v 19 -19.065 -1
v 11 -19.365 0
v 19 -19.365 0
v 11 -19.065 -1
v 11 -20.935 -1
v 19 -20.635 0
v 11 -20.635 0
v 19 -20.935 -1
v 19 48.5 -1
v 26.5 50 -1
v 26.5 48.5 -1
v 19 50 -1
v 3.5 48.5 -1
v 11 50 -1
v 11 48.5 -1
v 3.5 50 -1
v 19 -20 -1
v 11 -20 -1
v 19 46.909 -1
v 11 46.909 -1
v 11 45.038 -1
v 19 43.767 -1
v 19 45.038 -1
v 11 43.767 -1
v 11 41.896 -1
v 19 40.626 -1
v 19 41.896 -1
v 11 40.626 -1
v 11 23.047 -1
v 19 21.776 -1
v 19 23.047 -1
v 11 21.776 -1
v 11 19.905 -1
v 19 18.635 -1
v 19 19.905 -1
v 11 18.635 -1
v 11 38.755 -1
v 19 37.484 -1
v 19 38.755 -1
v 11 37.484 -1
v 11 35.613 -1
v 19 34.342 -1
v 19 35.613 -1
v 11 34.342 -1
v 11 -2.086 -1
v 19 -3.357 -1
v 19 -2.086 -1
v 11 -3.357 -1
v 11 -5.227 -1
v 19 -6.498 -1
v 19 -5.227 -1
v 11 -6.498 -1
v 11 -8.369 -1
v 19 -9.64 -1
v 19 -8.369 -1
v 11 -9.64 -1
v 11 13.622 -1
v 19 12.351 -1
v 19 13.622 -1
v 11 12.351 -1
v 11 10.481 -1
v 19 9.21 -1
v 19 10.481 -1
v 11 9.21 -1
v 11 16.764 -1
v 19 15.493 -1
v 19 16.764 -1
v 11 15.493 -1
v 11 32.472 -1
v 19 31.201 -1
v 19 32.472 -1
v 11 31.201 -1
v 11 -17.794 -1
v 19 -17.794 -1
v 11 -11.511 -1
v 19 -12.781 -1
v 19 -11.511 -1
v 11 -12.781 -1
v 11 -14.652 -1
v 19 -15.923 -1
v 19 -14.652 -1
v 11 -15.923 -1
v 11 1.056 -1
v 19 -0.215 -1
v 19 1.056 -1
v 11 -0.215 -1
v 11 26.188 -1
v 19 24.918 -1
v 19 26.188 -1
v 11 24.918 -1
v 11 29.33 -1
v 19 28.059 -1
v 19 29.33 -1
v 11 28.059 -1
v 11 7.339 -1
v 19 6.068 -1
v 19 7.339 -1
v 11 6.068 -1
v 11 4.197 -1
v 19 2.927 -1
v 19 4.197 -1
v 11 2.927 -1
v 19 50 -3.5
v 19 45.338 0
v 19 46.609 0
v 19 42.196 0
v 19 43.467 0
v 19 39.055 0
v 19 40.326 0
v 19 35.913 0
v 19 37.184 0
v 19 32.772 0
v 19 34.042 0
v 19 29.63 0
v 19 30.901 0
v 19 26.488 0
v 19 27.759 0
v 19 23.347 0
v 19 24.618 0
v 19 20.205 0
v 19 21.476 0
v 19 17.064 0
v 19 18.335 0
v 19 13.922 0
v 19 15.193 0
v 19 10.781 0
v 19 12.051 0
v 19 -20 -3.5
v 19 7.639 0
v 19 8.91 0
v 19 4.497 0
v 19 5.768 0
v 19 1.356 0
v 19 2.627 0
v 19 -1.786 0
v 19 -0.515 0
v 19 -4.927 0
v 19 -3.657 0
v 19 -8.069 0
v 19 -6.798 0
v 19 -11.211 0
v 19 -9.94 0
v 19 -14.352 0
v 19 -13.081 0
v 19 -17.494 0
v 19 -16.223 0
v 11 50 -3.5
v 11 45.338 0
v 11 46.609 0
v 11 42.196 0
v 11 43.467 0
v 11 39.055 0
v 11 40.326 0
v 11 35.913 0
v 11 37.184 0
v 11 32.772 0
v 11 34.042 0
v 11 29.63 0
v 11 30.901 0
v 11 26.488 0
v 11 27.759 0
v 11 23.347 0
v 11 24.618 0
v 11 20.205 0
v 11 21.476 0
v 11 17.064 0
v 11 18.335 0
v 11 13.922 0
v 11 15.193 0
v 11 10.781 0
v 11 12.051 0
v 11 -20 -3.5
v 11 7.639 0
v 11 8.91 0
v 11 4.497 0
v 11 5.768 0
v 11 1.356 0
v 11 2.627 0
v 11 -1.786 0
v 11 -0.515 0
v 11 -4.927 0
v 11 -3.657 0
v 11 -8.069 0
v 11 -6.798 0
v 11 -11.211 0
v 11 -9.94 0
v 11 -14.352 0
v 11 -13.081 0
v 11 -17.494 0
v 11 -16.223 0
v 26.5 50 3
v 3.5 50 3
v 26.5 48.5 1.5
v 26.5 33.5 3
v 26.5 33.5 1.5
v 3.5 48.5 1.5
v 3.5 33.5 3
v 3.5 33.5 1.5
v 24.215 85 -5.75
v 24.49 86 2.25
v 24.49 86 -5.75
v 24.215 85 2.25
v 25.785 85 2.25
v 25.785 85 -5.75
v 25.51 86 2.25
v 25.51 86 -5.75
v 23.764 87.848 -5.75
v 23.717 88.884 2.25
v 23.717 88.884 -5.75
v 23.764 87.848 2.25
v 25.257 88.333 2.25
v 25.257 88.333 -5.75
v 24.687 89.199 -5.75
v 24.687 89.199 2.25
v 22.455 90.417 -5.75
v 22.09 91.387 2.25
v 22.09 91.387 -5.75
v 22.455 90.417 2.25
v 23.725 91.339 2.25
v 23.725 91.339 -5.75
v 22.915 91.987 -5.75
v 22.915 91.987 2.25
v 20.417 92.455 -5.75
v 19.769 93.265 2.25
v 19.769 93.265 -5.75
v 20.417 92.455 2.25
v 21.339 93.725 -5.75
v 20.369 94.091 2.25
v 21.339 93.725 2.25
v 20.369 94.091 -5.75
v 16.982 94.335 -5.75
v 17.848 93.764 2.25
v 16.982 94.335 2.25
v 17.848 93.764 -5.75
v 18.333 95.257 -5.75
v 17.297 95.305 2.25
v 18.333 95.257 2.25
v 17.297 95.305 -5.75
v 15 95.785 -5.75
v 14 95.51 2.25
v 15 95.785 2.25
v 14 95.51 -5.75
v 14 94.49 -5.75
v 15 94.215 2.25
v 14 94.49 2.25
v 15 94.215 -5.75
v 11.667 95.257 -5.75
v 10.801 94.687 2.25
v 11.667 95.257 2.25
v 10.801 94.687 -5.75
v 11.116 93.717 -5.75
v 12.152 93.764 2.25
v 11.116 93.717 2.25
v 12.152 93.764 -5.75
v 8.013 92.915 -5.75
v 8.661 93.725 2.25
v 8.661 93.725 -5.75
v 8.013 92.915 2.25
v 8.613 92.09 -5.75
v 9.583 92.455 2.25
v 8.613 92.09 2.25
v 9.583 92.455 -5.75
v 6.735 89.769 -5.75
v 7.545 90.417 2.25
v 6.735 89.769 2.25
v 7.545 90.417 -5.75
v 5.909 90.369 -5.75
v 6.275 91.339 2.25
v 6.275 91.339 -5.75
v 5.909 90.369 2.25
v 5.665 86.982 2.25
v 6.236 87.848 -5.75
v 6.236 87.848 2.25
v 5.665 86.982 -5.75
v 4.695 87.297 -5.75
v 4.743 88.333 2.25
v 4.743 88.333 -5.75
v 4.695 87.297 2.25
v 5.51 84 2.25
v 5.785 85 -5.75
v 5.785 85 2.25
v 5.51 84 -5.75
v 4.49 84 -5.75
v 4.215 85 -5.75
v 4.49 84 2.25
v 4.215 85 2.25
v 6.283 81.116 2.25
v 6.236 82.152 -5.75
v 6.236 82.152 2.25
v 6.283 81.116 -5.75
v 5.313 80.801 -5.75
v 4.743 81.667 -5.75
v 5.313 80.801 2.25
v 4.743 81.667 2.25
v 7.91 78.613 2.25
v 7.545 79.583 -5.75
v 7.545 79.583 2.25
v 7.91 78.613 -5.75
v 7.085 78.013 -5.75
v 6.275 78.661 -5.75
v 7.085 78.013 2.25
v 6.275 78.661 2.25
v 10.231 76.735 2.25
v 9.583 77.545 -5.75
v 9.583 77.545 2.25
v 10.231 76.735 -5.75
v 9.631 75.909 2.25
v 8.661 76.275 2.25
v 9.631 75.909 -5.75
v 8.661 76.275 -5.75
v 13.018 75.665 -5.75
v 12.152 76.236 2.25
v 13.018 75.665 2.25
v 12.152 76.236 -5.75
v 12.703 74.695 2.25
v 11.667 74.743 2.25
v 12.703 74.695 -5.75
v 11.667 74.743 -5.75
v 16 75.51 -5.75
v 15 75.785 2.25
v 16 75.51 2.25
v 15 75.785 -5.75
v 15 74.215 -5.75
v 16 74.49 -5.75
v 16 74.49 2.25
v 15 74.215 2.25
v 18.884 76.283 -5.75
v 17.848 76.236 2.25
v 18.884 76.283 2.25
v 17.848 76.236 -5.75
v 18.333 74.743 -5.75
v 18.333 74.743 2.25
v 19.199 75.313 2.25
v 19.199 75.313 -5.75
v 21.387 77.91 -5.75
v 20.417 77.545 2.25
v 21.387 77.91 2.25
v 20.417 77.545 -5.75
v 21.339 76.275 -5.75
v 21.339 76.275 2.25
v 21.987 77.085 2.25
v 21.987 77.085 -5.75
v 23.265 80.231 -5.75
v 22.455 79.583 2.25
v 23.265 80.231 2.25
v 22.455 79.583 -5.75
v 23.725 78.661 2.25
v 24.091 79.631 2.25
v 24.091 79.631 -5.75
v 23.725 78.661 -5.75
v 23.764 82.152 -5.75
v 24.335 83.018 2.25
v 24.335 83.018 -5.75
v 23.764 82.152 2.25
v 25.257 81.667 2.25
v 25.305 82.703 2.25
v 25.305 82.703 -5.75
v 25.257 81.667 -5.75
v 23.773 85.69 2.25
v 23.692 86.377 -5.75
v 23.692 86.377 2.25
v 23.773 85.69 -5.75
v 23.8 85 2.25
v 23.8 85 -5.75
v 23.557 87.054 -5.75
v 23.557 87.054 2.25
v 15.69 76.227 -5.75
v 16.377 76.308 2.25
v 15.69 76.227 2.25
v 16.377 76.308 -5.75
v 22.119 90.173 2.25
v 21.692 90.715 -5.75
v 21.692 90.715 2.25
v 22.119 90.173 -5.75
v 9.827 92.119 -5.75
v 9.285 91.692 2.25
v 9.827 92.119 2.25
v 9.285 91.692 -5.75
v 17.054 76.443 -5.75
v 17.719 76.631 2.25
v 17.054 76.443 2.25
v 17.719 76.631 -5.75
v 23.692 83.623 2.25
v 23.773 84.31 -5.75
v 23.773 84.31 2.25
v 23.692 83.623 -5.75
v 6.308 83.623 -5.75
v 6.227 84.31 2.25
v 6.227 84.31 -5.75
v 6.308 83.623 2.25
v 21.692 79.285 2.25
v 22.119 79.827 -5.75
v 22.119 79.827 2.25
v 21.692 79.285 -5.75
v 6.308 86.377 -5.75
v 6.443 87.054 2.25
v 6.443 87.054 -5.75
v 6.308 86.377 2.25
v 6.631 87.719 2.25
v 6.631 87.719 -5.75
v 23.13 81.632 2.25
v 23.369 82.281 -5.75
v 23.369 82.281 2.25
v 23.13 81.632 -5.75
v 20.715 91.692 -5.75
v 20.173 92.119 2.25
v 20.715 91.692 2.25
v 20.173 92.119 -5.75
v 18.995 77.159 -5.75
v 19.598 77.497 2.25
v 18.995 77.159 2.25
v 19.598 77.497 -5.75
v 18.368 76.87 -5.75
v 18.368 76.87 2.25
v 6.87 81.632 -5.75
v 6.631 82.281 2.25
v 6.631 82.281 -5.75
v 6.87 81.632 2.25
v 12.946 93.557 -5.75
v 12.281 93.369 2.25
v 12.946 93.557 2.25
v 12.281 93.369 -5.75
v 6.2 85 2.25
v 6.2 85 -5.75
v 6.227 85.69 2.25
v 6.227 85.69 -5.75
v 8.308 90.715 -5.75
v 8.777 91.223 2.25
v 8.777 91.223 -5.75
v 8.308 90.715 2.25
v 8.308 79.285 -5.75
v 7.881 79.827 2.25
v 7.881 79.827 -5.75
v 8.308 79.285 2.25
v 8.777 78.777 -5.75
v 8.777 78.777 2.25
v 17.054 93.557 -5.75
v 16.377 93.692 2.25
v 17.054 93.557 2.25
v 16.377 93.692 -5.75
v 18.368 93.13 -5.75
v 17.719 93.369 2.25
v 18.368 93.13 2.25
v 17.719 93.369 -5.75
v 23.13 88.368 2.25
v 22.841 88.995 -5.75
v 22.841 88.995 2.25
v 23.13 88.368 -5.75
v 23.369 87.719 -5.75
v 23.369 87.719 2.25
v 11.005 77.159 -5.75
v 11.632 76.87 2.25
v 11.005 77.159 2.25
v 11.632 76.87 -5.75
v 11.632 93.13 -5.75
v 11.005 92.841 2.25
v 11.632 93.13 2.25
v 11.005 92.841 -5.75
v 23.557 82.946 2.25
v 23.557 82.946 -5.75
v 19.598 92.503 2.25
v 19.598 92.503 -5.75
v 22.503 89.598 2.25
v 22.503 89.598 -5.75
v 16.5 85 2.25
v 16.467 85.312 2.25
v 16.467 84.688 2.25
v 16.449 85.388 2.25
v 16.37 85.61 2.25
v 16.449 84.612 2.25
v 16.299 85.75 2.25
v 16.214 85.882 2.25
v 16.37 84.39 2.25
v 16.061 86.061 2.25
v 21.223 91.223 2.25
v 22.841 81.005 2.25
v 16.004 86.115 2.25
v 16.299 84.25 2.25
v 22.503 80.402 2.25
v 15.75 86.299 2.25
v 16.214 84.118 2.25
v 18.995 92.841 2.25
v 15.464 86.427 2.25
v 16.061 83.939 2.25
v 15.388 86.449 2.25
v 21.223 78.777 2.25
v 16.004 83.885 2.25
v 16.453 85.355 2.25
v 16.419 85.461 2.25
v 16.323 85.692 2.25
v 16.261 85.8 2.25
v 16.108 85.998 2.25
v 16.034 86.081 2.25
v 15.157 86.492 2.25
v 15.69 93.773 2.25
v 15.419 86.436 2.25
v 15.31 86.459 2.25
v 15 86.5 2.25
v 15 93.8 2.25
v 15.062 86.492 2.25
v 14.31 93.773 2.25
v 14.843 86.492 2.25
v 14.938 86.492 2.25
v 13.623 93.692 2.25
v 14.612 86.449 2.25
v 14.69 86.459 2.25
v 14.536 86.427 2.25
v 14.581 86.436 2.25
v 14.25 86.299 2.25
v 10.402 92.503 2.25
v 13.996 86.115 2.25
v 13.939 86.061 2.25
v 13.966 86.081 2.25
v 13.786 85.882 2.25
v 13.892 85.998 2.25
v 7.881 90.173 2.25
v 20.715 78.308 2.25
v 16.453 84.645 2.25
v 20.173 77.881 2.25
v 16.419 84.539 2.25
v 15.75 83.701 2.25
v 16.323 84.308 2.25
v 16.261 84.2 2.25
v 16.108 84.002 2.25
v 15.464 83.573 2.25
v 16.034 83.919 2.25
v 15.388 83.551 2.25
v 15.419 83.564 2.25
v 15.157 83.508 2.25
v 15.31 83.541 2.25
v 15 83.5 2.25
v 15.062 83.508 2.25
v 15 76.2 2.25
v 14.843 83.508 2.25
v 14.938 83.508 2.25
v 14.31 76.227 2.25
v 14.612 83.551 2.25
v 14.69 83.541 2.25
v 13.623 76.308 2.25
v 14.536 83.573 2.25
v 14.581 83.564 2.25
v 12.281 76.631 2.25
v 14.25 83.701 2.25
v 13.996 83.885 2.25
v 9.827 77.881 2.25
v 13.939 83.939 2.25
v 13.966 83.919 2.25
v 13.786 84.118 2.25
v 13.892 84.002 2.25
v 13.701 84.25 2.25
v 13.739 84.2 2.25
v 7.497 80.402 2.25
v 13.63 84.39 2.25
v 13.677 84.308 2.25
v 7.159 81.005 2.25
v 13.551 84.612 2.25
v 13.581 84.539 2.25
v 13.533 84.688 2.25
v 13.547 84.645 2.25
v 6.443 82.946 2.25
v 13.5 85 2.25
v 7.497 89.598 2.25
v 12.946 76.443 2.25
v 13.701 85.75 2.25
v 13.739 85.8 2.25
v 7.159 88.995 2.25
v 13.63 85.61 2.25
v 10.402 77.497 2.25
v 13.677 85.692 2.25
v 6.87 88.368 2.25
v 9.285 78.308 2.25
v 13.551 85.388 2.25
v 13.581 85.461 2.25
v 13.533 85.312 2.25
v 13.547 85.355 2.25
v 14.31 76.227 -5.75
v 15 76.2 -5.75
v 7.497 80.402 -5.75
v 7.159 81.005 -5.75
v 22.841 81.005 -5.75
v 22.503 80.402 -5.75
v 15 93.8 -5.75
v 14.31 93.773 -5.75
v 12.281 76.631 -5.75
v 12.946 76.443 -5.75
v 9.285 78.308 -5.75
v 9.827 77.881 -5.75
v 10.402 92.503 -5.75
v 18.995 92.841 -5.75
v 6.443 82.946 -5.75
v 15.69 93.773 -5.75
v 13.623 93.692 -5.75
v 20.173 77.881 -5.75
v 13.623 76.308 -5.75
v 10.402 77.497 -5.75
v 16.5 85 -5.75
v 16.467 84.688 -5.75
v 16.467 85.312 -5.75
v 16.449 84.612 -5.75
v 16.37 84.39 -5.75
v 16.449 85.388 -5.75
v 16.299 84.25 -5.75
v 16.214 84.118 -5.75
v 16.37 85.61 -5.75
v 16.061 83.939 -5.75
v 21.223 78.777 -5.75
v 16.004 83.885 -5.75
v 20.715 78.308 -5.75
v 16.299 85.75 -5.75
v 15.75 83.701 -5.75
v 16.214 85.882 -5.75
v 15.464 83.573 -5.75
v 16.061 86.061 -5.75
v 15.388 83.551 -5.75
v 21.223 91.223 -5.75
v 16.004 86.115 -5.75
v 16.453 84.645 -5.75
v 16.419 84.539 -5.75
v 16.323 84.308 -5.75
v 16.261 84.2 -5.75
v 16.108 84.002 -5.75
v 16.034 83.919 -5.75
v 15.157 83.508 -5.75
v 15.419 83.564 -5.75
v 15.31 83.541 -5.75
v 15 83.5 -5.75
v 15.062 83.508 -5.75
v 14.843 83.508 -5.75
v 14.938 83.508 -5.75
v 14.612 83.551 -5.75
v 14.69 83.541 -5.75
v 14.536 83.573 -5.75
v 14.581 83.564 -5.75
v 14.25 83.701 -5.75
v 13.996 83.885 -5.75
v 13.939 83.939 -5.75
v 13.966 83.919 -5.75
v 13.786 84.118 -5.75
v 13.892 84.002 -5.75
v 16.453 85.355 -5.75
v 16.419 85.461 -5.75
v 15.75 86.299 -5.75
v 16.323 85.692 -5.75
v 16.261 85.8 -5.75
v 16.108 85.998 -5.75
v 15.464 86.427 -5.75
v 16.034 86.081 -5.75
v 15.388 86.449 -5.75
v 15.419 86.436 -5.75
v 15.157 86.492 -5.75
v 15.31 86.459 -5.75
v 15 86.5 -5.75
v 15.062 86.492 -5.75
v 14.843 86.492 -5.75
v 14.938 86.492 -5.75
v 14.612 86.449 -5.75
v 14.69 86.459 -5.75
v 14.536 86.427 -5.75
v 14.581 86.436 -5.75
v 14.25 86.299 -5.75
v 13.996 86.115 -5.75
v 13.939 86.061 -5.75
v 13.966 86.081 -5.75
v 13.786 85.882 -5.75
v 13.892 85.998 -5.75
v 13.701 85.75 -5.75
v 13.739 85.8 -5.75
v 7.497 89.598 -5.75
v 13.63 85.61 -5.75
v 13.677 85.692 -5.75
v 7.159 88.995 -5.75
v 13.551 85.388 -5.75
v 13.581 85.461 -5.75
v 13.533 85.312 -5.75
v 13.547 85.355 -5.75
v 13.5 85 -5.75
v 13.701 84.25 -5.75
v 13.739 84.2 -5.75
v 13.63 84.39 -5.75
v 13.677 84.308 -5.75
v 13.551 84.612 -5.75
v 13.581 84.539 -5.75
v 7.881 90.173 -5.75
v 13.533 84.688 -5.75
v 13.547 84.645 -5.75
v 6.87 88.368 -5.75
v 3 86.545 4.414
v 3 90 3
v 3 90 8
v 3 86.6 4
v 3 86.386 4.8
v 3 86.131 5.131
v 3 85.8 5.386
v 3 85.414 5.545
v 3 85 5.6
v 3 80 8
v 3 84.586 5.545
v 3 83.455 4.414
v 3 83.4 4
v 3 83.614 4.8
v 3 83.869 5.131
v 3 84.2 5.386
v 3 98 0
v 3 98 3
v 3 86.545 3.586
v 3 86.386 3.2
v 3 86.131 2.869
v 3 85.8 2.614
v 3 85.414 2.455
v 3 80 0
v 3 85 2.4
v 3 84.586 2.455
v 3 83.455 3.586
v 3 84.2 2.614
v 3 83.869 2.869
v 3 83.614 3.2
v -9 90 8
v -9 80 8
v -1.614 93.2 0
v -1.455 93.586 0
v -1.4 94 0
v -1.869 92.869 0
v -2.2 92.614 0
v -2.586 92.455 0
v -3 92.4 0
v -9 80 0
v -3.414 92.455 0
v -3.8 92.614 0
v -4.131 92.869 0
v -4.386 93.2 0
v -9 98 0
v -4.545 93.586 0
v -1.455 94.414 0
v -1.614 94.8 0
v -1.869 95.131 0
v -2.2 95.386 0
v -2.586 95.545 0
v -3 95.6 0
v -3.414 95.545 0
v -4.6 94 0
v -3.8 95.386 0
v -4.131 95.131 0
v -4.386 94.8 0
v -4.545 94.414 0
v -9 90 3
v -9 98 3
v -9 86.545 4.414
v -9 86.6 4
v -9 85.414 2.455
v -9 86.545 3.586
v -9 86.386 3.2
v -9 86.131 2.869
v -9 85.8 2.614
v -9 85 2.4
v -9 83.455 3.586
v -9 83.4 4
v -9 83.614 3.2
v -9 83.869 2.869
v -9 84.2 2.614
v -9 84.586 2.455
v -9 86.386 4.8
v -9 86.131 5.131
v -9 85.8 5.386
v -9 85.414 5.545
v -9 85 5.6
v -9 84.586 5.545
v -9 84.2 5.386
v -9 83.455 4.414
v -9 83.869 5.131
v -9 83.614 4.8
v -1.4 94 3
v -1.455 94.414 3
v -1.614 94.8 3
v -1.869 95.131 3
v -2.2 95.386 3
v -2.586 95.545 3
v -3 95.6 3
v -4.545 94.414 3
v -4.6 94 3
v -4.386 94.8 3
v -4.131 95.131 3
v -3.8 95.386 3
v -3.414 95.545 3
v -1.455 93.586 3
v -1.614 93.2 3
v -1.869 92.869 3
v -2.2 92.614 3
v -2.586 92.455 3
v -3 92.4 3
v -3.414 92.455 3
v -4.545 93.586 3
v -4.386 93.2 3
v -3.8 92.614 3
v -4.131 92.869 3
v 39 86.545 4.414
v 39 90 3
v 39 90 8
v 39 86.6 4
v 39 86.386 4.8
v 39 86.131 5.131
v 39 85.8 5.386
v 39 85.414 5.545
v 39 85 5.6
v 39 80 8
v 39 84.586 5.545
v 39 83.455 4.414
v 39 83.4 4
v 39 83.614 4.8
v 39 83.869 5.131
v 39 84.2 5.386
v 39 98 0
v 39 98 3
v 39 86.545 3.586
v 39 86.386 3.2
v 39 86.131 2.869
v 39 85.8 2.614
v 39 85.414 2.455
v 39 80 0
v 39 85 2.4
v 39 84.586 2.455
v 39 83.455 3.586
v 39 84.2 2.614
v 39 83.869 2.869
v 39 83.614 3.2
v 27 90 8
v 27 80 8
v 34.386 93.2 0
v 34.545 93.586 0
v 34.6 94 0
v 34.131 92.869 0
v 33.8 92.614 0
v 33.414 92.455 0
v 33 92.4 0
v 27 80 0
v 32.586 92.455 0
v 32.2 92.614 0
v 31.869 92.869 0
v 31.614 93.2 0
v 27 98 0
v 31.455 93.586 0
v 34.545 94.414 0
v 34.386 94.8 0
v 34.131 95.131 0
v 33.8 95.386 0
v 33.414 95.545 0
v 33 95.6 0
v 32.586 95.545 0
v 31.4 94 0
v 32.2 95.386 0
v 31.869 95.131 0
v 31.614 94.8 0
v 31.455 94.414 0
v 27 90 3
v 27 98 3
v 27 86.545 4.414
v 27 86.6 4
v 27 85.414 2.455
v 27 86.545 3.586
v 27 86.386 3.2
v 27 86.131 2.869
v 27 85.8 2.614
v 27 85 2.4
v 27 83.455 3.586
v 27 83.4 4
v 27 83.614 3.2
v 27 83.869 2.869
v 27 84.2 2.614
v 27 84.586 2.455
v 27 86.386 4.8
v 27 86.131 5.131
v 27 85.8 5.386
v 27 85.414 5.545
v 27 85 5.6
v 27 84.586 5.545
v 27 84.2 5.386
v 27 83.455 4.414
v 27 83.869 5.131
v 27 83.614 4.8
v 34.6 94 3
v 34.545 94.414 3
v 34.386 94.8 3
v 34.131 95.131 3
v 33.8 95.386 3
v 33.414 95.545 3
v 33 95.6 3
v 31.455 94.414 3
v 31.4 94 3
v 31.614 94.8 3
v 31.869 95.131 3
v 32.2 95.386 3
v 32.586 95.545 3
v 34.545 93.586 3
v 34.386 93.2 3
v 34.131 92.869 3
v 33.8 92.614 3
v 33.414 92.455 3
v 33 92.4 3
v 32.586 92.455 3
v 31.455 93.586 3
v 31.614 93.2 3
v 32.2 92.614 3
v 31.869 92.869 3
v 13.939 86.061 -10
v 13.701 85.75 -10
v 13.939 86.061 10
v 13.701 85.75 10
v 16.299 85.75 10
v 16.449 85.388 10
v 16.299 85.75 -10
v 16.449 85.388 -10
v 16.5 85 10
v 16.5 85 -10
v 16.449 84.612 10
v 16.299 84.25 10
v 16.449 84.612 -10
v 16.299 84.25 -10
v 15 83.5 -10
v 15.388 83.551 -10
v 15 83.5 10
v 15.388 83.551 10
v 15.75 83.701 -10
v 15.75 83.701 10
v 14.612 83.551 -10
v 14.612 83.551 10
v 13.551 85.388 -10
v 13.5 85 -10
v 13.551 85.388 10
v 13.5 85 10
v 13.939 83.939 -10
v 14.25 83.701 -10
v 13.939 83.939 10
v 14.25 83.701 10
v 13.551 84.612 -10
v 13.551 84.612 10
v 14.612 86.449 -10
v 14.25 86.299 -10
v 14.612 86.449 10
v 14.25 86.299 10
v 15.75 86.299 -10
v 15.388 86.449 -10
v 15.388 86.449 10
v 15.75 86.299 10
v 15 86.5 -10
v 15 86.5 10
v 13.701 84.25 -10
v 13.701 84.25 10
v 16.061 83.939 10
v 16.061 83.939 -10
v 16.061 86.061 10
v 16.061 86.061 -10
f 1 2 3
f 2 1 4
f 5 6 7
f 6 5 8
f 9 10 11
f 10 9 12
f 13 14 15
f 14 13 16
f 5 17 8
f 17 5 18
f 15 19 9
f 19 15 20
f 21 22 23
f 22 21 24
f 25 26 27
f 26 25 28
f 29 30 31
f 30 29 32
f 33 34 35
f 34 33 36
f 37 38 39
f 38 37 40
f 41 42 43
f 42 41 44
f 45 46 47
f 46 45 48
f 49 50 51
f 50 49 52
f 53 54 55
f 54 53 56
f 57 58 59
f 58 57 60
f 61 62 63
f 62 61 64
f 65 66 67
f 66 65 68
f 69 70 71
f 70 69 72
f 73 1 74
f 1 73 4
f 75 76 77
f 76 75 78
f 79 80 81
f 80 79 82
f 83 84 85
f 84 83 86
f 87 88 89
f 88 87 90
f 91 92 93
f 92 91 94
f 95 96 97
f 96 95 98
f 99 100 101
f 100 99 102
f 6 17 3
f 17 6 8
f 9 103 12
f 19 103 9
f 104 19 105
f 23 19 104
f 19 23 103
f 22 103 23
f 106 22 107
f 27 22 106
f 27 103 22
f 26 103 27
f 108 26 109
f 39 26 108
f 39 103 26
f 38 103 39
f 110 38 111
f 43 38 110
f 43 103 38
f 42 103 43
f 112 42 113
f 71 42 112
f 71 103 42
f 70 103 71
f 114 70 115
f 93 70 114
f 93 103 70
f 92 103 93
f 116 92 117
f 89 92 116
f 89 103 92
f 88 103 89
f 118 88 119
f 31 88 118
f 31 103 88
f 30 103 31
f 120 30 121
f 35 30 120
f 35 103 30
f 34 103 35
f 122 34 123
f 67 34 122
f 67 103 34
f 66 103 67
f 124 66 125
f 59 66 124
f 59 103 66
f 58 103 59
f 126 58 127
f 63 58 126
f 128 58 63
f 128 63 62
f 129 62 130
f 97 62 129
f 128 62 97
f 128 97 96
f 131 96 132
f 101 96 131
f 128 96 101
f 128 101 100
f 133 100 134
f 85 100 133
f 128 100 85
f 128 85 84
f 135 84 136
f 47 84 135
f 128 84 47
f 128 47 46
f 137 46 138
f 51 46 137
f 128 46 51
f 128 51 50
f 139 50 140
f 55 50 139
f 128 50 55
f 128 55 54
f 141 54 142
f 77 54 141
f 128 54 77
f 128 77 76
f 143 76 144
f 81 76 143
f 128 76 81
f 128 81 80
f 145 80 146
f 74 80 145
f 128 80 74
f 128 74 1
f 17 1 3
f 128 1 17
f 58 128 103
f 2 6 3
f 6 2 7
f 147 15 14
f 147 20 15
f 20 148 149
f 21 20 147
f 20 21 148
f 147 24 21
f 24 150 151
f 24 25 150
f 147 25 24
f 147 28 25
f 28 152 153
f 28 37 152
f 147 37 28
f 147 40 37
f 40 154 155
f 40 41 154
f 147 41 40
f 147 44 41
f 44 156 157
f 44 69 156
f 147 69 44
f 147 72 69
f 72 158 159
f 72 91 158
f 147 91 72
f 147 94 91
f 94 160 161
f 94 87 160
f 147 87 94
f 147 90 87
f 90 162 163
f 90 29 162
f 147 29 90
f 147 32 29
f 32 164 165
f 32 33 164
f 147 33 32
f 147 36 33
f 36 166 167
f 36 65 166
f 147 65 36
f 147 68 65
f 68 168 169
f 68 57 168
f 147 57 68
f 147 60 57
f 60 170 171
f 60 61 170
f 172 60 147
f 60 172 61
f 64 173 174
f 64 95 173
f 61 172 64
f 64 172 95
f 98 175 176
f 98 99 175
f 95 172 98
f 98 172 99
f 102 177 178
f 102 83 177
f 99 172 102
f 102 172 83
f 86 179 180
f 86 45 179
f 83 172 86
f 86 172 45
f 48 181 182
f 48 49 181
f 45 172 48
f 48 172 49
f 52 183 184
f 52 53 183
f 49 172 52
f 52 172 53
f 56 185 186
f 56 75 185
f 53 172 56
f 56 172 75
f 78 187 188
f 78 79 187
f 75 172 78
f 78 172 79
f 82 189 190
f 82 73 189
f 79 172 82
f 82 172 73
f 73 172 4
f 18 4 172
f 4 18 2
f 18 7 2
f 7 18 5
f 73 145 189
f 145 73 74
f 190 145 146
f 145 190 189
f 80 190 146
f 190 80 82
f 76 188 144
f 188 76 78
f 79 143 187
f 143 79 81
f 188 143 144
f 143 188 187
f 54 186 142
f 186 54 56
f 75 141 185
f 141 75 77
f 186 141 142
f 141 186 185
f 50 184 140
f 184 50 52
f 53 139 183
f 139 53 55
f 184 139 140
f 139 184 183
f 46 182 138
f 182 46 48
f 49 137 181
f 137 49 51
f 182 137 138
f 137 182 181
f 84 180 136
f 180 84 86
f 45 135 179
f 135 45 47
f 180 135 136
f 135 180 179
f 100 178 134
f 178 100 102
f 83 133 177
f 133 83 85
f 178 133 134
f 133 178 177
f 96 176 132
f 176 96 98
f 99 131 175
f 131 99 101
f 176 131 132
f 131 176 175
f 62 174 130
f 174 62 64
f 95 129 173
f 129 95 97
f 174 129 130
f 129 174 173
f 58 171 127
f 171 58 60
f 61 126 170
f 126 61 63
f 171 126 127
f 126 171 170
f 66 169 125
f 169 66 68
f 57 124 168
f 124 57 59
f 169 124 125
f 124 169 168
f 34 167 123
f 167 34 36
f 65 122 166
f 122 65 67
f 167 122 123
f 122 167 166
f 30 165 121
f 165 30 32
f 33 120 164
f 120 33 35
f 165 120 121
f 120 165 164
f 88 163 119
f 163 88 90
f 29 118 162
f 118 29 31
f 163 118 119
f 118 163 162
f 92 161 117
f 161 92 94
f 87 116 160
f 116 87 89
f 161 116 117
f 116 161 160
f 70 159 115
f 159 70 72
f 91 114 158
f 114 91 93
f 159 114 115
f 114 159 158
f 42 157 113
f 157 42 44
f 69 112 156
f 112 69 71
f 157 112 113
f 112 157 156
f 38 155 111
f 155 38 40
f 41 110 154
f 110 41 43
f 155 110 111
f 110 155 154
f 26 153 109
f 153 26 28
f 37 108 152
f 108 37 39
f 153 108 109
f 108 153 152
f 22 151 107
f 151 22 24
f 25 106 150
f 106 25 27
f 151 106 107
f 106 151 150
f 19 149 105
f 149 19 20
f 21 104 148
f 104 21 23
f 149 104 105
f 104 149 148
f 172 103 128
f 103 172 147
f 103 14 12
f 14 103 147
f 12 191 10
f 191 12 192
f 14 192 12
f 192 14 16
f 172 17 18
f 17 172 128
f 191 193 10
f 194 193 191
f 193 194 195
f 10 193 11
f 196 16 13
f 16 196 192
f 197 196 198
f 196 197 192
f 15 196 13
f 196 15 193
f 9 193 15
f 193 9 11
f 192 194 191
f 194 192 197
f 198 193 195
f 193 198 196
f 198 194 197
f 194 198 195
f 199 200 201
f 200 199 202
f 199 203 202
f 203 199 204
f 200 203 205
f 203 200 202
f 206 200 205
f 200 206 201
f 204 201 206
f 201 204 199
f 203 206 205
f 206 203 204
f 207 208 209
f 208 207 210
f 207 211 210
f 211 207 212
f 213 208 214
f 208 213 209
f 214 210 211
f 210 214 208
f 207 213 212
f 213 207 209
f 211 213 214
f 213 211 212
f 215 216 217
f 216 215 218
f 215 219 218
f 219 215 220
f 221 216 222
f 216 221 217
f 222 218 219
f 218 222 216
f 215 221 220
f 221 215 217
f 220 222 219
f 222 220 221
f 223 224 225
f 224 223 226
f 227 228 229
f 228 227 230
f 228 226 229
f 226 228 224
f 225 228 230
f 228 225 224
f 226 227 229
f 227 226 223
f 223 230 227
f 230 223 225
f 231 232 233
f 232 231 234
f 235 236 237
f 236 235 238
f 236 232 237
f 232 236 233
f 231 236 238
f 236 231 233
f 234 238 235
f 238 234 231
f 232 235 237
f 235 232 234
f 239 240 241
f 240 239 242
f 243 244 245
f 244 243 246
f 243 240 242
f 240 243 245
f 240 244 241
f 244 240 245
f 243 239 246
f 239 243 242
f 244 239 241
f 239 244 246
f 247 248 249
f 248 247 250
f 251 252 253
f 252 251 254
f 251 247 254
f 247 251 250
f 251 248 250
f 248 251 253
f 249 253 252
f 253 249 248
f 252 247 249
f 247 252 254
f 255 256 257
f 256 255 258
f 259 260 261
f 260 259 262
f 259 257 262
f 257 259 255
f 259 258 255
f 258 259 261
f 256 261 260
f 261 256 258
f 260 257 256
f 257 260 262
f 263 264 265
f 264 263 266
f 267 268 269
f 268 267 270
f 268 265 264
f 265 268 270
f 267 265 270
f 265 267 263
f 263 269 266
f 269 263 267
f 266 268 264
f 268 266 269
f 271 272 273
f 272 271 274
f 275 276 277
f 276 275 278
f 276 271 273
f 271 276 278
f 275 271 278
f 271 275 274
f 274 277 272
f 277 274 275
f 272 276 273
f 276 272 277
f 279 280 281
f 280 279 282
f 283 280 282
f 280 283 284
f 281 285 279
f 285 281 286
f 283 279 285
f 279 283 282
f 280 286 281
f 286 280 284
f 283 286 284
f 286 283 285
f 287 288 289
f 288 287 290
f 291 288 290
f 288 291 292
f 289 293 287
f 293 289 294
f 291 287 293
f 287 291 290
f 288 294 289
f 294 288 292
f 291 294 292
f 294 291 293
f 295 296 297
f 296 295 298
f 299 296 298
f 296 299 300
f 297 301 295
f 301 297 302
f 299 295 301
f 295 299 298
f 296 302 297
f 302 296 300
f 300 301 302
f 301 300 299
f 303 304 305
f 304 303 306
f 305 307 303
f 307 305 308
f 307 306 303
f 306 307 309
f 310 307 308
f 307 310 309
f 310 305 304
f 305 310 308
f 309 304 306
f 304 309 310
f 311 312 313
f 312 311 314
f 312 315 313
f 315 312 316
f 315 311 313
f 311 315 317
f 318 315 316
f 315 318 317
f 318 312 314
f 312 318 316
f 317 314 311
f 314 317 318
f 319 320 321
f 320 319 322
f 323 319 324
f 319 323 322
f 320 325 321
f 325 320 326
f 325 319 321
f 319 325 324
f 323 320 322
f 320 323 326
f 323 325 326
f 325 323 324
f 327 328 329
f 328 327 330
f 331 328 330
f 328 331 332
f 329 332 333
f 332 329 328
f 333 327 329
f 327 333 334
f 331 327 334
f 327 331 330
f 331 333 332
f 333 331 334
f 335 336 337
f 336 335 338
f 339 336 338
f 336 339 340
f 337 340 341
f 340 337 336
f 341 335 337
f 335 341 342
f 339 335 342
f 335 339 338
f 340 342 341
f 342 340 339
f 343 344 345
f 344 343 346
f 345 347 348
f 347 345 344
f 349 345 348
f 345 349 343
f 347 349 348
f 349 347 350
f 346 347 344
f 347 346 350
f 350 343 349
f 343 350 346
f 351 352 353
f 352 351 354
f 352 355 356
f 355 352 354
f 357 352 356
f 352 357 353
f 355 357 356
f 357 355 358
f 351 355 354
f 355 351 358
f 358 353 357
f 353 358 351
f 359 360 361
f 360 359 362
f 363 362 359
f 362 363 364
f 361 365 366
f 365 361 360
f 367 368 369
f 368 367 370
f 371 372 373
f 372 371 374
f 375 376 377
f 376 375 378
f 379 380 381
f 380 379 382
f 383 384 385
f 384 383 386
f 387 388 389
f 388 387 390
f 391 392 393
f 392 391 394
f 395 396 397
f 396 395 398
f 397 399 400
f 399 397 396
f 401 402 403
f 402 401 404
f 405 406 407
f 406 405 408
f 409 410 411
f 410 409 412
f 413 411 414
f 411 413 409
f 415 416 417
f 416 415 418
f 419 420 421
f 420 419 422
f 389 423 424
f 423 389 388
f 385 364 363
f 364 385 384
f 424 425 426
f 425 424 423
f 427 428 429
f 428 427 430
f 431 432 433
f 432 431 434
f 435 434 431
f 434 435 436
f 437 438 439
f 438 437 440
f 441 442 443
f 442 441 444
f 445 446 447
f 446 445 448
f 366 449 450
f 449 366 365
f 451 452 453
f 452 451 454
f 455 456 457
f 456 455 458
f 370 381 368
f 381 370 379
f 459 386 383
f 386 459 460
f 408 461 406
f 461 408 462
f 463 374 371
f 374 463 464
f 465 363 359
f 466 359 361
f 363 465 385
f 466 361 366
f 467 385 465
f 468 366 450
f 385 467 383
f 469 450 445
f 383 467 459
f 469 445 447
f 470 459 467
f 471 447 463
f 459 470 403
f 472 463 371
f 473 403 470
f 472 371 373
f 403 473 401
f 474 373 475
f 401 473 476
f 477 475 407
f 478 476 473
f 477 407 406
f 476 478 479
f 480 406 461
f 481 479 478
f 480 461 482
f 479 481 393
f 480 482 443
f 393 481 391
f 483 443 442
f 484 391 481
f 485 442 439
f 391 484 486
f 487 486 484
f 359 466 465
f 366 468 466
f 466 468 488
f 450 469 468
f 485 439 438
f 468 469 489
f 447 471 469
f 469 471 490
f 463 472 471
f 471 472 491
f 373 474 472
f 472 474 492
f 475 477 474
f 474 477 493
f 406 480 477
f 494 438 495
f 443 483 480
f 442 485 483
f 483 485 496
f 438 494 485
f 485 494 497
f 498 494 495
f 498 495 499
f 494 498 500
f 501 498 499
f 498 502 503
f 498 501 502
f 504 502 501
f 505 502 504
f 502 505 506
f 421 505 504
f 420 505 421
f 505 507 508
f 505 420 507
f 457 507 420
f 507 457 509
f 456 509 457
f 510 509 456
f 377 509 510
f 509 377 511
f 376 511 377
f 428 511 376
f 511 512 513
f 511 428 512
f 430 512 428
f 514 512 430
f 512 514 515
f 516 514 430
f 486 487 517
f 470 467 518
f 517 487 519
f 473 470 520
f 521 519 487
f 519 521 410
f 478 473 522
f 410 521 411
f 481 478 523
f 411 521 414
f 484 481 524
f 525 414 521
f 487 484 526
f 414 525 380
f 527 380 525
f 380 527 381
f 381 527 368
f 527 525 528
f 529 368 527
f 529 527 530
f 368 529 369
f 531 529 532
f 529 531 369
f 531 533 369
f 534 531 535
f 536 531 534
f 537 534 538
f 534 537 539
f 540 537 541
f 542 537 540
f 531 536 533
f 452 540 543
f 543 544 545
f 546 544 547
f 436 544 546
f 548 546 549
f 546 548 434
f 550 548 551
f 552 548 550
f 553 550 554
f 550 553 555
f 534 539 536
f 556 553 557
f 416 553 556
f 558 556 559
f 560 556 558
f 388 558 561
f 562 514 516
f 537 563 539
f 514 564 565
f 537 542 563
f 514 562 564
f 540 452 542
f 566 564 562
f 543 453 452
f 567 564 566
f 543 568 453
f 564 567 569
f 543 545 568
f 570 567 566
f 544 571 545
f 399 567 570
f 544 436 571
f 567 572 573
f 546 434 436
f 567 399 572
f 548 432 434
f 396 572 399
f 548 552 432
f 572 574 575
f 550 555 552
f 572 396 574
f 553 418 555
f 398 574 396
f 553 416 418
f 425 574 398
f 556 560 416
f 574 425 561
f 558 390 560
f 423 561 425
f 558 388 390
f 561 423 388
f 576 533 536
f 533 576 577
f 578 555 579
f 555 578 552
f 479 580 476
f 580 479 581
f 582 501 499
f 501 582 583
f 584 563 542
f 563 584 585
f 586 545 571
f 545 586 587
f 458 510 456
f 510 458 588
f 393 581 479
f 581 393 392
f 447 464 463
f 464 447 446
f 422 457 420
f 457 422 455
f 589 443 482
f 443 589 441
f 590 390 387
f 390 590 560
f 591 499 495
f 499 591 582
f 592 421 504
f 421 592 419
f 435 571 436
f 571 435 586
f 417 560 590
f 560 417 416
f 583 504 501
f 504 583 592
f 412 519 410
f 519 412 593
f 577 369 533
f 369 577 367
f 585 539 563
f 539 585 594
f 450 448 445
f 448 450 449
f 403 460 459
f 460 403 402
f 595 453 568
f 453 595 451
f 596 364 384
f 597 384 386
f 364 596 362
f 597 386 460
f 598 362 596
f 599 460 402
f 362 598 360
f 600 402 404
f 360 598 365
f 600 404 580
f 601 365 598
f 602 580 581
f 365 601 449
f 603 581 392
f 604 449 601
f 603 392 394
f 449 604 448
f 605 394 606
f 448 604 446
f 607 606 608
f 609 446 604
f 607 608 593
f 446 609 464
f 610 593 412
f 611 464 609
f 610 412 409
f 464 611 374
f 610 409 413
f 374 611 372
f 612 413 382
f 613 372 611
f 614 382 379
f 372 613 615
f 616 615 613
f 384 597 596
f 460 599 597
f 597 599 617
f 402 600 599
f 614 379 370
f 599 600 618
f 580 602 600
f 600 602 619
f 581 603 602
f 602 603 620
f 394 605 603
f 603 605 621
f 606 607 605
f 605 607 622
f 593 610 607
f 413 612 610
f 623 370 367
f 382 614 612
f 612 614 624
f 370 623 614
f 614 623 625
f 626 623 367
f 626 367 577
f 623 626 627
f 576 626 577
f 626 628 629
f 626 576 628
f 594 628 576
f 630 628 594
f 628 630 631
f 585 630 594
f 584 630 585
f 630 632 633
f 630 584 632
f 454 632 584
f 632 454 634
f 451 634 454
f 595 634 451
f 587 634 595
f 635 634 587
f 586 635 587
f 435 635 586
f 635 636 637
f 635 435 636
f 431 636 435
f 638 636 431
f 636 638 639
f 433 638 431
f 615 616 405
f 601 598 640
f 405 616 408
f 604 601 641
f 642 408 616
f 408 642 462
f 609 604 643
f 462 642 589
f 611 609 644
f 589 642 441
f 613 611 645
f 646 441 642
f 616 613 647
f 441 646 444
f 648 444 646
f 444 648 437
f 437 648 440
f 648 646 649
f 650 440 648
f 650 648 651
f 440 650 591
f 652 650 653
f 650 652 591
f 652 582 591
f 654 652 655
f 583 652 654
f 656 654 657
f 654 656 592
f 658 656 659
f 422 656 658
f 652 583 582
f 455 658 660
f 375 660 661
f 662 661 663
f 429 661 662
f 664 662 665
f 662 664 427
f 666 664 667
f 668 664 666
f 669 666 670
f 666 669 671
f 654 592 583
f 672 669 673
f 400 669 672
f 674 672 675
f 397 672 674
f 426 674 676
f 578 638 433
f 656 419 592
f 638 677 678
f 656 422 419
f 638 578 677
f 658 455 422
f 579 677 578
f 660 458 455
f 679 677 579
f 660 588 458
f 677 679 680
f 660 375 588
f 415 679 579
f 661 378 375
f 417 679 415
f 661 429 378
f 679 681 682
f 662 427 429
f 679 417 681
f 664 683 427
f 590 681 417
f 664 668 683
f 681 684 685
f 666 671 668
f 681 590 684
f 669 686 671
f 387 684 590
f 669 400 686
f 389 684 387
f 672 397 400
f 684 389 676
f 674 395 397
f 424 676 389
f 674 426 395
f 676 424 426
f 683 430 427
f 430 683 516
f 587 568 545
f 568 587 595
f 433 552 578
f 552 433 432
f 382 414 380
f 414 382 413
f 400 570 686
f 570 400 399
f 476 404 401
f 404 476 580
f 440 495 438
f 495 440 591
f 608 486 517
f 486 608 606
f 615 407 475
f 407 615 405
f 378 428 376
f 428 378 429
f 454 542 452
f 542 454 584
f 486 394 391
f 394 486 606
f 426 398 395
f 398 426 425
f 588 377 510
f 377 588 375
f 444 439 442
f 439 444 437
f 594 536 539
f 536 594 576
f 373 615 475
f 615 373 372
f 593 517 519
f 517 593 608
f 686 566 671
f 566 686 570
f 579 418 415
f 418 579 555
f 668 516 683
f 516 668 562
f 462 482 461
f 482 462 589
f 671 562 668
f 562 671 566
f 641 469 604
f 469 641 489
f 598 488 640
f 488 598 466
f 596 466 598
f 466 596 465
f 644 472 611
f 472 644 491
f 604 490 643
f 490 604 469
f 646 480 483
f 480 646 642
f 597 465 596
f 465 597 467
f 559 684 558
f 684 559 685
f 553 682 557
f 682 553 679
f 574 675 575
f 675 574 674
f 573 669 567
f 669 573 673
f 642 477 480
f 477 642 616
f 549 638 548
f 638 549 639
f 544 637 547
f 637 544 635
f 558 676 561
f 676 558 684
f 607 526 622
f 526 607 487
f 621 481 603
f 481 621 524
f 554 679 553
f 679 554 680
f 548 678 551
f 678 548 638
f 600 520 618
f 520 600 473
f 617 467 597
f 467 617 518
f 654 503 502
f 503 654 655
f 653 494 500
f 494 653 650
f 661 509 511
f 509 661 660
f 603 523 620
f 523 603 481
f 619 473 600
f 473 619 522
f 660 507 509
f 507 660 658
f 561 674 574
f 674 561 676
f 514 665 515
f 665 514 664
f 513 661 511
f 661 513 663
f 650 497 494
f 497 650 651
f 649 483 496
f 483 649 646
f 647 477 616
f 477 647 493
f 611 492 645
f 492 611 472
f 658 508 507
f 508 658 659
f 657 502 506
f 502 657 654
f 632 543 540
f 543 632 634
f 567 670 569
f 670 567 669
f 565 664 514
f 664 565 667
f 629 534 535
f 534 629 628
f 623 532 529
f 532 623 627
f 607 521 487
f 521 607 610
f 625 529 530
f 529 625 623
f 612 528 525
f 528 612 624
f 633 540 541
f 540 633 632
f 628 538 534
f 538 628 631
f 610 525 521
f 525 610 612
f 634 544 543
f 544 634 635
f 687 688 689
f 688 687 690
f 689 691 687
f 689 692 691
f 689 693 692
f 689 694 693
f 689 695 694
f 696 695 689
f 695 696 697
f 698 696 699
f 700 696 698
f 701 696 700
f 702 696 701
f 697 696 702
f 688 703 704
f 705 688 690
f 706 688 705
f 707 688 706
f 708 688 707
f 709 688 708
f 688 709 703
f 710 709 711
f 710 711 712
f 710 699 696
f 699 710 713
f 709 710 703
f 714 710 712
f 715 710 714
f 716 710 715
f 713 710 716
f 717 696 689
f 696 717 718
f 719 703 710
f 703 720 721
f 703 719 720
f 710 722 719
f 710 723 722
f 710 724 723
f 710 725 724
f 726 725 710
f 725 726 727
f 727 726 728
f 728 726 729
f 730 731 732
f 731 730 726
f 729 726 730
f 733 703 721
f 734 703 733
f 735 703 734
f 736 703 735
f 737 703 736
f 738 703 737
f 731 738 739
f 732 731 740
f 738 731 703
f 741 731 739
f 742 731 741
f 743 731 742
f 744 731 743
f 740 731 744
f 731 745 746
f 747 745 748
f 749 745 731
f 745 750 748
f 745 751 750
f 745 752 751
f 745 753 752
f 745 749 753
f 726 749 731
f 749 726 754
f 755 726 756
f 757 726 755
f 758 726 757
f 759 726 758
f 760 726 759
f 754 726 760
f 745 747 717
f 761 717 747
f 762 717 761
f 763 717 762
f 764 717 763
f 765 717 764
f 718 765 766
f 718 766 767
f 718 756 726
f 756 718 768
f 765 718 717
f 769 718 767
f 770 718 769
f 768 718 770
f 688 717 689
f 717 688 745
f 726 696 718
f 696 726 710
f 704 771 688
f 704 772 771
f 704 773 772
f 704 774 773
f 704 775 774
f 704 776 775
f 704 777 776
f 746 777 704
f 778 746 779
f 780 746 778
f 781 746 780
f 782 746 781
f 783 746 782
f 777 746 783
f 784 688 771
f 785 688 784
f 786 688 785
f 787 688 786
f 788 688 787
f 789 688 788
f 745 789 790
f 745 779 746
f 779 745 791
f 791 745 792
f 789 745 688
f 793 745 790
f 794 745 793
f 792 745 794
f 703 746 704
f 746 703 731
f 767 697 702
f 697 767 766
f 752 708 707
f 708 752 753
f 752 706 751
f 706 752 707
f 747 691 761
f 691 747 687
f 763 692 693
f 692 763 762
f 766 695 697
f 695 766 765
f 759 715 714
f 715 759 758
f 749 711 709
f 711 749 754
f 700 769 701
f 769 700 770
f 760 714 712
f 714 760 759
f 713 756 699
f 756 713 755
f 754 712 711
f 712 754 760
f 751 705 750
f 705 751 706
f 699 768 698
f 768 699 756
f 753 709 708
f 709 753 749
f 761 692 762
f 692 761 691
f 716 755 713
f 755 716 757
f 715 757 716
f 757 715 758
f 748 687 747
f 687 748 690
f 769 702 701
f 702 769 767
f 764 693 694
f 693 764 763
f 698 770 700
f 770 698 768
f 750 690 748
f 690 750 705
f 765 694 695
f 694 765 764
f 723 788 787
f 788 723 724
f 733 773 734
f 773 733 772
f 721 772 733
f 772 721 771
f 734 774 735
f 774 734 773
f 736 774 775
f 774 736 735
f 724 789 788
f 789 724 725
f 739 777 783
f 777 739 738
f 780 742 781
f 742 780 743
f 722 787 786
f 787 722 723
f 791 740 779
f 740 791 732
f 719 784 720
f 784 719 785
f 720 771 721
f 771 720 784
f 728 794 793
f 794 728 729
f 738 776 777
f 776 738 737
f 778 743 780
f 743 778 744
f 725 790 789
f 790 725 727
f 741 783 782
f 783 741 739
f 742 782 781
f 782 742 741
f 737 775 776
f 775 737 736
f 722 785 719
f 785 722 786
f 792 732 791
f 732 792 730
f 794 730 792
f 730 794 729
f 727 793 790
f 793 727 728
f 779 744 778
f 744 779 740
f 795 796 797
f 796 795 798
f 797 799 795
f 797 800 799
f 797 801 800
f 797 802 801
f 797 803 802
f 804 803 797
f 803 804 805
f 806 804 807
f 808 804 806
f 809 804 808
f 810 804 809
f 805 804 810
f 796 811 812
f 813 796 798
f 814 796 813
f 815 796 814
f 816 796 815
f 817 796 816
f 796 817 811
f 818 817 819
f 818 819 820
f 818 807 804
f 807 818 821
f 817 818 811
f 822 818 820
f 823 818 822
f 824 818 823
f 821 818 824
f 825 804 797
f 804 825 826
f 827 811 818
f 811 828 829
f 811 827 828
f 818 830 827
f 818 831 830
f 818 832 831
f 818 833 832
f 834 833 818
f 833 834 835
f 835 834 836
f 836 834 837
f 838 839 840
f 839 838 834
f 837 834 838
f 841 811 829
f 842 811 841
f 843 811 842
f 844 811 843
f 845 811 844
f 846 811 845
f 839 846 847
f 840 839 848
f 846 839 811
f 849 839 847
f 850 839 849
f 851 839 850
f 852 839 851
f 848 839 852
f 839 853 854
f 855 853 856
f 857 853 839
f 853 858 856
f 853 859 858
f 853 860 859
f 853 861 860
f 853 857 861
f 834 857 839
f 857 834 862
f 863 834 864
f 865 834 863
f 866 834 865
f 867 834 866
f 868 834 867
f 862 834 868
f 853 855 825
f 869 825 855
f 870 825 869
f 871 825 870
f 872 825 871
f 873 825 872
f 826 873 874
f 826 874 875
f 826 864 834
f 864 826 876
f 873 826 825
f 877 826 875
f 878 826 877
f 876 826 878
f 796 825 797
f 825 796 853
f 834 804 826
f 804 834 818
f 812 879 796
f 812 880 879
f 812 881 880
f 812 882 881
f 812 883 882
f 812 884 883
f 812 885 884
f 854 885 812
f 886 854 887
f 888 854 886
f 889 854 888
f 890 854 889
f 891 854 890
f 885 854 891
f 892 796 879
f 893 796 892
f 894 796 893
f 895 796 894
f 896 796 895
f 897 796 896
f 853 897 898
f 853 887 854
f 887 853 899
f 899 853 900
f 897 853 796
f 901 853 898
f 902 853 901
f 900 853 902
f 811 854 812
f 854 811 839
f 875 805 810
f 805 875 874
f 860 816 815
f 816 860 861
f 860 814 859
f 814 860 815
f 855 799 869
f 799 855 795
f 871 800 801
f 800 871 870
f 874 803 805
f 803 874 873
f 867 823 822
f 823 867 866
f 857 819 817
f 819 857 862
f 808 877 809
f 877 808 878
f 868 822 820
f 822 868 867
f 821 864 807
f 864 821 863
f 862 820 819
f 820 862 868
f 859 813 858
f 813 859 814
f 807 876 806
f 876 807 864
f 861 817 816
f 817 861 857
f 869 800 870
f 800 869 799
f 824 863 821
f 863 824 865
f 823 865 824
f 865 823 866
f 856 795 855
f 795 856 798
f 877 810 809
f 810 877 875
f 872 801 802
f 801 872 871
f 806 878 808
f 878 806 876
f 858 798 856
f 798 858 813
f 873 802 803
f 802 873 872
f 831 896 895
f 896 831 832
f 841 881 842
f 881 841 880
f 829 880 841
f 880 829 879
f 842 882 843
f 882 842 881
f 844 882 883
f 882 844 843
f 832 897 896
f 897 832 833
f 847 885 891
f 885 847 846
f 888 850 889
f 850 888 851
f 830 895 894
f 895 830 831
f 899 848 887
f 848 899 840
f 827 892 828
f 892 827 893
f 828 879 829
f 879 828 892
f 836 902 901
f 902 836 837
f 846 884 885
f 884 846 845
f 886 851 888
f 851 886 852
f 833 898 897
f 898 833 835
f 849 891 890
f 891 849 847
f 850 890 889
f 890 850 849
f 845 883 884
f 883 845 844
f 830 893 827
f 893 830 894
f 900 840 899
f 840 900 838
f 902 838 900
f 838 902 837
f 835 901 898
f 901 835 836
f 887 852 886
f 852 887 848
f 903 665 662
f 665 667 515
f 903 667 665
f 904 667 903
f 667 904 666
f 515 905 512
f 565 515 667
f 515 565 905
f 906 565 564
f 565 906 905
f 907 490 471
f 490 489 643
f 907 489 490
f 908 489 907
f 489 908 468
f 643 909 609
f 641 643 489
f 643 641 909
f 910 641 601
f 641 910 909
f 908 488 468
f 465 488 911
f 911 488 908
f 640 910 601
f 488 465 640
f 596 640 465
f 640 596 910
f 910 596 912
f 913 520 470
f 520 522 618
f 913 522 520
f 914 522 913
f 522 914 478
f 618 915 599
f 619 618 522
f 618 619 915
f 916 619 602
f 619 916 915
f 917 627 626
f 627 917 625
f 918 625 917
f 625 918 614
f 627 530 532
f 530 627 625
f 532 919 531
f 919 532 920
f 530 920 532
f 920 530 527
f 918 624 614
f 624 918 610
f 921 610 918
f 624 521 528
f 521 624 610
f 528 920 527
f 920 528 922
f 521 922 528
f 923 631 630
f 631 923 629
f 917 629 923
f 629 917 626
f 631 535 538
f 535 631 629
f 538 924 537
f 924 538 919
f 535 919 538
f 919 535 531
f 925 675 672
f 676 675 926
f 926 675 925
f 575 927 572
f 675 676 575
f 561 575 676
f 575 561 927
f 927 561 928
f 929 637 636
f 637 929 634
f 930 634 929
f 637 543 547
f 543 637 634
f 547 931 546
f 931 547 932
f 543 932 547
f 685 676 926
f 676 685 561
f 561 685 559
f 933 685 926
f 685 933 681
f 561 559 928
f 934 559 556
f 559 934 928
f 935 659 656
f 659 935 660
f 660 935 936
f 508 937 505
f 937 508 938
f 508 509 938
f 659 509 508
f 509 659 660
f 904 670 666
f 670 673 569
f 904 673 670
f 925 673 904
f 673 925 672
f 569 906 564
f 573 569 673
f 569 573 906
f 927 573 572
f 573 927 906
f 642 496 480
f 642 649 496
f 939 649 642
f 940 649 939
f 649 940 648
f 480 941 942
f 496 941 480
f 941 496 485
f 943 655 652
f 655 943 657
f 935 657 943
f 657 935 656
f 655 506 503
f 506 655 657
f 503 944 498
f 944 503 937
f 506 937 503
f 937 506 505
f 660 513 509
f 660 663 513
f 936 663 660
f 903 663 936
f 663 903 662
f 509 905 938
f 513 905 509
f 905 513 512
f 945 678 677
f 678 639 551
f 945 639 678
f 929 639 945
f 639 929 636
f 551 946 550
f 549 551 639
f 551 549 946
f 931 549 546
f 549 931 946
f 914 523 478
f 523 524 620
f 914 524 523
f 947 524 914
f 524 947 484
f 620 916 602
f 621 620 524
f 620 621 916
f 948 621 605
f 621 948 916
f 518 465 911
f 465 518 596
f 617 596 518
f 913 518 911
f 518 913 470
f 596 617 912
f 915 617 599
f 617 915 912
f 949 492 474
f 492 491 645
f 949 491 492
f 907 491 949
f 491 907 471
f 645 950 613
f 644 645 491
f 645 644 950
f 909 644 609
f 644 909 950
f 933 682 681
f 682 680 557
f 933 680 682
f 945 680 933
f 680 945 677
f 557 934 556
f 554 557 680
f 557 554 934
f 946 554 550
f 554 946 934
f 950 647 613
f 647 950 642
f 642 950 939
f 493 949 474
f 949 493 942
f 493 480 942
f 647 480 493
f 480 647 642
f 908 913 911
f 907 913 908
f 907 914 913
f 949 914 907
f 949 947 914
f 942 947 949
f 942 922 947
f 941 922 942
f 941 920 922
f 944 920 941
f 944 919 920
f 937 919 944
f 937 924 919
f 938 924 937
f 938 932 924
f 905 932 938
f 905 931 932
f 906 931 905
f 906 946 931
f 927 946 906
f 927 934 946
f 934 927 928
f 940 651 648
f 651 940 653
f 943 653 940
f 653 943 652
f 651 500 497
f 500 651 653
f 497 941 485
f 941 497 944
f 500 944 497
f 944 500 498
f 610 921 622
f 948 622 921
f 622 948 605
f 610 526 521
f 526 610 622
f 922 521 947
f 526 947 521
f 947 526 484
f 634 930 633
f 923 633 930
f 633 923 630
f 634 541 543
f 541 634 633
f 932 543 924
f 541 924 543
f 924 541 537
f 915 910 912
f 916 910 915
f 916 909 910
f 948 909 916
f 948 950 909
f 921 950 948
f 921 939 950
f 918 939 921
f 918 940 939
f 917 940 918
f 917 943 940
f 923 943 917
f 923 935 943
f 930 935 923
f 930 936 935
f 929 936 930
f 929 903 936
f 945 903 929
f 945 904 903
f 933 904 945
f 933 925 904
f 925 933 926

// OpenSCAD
// 盲人取药机 - 齿条齿轮驱动药盒推出模块
// 适配底板：sliding_track_base.scad（base_w=30, base_l=90, base_t=5）
// 适配药盒：子弹.scad（25x35x15mm, 底厚 1.5mm）
// 驱动：模数1.0 齿条 + 齿轮，电机轴径3mm

// ---------- 全局参数 ----------

// 底板参数（来自 sliding_track_base.scad，仅引用不修改）
base_w  = 30;
base_l  = 90;
base_t  = 5;
groove_w = 26;
groove_d = 2;

// 齿条参数
modulus    = 1.0;
pitch      = PI * modulus;
addendum   = 1.0 * modulus;
dedendum   = 1.2 * modulus;
tooth_thick = pitch / 2;
rack_w     = 8;
rack_thick = 3.5;
rack_len   = 70;
tooth_cnt  = floor(rack_len / pitch);

// 推头参数
pusher_w     = 23;
pusher_tab_t = 1.5;
pusher_arm_t = 1.5;

// 齿轮参数
gear_teeth  = 20;
gear_r      = gear_teeth * modulus / 2;
gear_outer_r = gear_r + addendum;
gear_root_r  = gear_r - dedendum;
gear_w      = rack_w;
shaft_d     = 3;
shaft_len   = 20;

// 轴座参数
bearing_block_w  = 12;
bearing_block_d  = 10;
bearing_block_h  = 8;
bearing_hole_d   = 3.2;
mount_hole_d     = 3.2;

// 装配坐标
rack_x = (base_w - rack_w) / 2;
rack_z = -rack_thick;
rack_y0 = -20;

gear_cx = base_w / 2;
gear_cy = base_l - 5;
gear_cz = rack_z + rack_thick / 2;

bearing_y = gear_cy;
mount_inset = 6;
eps = 0.01;

// 模块 1：单个齿条齿（梯形齿廓）
module rack_tooth_profile() {
    bw = tooth_thick + 0.3;
    tw = tooth_thick - 0.3;
    rotate([90, 0, 90])
    linear_extrude(height = rack_w, center = false)
        polygon(points = [
            [-bw/2, 0],
            [ bw/2, 0],
            [ tw/2, addendum],
            [-tw/2, addendum]
        ]);
}

// 模块 2：齿条（基体 + 齿阵列）
module rack() {
    color("SteelBlue")
    union() {
        cube([rack_w, rack_len, rack_thick - addendum]);
        for (i = [0 : tooth_cnt - 1]) {
            translate([0, i * pitch, rack_thick - addendum])
                rack_tooth_profile();
        }
    }
}

// 模块 3：L 形推头
module pusher_head() {
    color("OrangeRed")
    union() {
        // 竖板：穿过凹槽
        translate([(rack_w - pusher_w) / 2, -pusher_tab_t, rack_thick - addendum])
            cube([pusher_w, pusher_tab_t, base_t - (rack_thick - addendum) + addendum]);

        // 横板（托板）：在凹槽上方
        translate([(rack_w - pusher_w) / 2, -pusher_tab_t - 15, base_t])
            cube([pusher_w, 15 + pusher_tab_t, pusher_arm_t]);

        // 加强筋
        hull() {
            translate([0, -0.1, rack_thick - addendum])
                cube([rack_w, 0.1, 0.1]);
            translate([(rack_w - pusher_w) / 2, -pusher_tab_t, base_t - 0.1])
                cube([pusher_w, 0.1, 0.1]);
        }
    }
}

// 模块 4：齿条+推头总成
module rack_assembly() {
    translate([rack_x, rack_y0, rack_z]) {
        rack();
        translate([0, rack_len, 0])
            pusher_head();
    }
}

// 模块 5：齿轮齿廓截面（梯形近似）
module gear_tooth_2d() {
    bw = 2 * gear_r * sin(tooth_thick / (2 * gear_r) * 180 / PI);
    tw = bw * 0.65;
    polygon(points = [
        [-bw/2, 0],
        [ bw/2, 0],
        [ tw/2, addendum],
        [-tw/2, addendum]
    ]);
}

// 模块 6：直齿圆柱齿轮
module spur_gear() {
    color("DodgerBlue")
    difference() {
        union() {
            cylinder(h = gear_w, r = gear_root_r, center = false, $fn = 80);
            for (i = [0 : gear_teeth - 1]) {
                angle = i * 360 / gear_teeth;
                rotate([0, 0, angle])
                    translate([gear_r, 0, 0])
                        linear_extrude(height = gear_w, center = false)
                            gear_tooth_2d();
            }
        }
        translate([0, 0, -eps])
            cylinder(h = gear_w + 2 * eps, r = shaft_d / 2, center = false, $fn = 30);
    }
}

// 模块 7：轴
module shaft() {
    color("Silver")
    translate([0, 0, -shaft_len / 2])
        cylinder(h = shaft_len, r = shaft_d / 2, center = false, $fn = 24);
}

// 模块 8：轴座
module bearing_block() {
    color("SlateGray")
    difference() {
        union() {
            cube([bearing_block_w, bearing_block_d, bearing_block_h]);
            cube([bearing_block_w, bearing_block_d + 8, 3]);
        }
        translate([-eps, bearing_block_d / 2, bearing_block_h / 2])
            rotate([0, 90, 0])
                cylinder(h = bearing_block_w + 2 * eps, r = bearing_hole_d / 2, $fn = 24);
        translate([bearing_block_w / 2, bearing_block_d + 4, -eps])
            cylinder(h = 3 + 2 * eps, r = mount_hole_d / 2, $fn = 24);
    }
}

// 模块 9：齿轮总成
module gear_assembly() {
    translate([gear_cx, gear_cy, gear_cz - gear_w / 2])
        spur_gear();

    translate([gear_cx, gear_cy, 0])
        shaft();

    translate([gear_cx - bearing_block_w - gear_outer_r - 1, bearing_y - bearing_block_d / 2, 0])
        bearing_block();

    translate([gear_cx + gear_outer_r + 1, bearing_y - bearing_block_d / 2, 0])
        bearing_block();
}

// 模块 10：完整推出模块总成
module pusher_assembly() {
    rack_assembly();
    gear_assembly();
}

// 渲染：完整总成 + 半透明底板（仅用于空间验证）
pusher_assembly();

%translate([0, 0, 0])
    sliding_track_base_ref();

module sliding_track_base_ref() {
    color("LightGray", 0.3)
    difference() {
        cube([base_w, base_l, base_t]);
        translate([(base_w - groove_w) / 2, 0, base_t - groove_d])
            cube([groove_w, base_l, groove_d + eps]);
    }
}
